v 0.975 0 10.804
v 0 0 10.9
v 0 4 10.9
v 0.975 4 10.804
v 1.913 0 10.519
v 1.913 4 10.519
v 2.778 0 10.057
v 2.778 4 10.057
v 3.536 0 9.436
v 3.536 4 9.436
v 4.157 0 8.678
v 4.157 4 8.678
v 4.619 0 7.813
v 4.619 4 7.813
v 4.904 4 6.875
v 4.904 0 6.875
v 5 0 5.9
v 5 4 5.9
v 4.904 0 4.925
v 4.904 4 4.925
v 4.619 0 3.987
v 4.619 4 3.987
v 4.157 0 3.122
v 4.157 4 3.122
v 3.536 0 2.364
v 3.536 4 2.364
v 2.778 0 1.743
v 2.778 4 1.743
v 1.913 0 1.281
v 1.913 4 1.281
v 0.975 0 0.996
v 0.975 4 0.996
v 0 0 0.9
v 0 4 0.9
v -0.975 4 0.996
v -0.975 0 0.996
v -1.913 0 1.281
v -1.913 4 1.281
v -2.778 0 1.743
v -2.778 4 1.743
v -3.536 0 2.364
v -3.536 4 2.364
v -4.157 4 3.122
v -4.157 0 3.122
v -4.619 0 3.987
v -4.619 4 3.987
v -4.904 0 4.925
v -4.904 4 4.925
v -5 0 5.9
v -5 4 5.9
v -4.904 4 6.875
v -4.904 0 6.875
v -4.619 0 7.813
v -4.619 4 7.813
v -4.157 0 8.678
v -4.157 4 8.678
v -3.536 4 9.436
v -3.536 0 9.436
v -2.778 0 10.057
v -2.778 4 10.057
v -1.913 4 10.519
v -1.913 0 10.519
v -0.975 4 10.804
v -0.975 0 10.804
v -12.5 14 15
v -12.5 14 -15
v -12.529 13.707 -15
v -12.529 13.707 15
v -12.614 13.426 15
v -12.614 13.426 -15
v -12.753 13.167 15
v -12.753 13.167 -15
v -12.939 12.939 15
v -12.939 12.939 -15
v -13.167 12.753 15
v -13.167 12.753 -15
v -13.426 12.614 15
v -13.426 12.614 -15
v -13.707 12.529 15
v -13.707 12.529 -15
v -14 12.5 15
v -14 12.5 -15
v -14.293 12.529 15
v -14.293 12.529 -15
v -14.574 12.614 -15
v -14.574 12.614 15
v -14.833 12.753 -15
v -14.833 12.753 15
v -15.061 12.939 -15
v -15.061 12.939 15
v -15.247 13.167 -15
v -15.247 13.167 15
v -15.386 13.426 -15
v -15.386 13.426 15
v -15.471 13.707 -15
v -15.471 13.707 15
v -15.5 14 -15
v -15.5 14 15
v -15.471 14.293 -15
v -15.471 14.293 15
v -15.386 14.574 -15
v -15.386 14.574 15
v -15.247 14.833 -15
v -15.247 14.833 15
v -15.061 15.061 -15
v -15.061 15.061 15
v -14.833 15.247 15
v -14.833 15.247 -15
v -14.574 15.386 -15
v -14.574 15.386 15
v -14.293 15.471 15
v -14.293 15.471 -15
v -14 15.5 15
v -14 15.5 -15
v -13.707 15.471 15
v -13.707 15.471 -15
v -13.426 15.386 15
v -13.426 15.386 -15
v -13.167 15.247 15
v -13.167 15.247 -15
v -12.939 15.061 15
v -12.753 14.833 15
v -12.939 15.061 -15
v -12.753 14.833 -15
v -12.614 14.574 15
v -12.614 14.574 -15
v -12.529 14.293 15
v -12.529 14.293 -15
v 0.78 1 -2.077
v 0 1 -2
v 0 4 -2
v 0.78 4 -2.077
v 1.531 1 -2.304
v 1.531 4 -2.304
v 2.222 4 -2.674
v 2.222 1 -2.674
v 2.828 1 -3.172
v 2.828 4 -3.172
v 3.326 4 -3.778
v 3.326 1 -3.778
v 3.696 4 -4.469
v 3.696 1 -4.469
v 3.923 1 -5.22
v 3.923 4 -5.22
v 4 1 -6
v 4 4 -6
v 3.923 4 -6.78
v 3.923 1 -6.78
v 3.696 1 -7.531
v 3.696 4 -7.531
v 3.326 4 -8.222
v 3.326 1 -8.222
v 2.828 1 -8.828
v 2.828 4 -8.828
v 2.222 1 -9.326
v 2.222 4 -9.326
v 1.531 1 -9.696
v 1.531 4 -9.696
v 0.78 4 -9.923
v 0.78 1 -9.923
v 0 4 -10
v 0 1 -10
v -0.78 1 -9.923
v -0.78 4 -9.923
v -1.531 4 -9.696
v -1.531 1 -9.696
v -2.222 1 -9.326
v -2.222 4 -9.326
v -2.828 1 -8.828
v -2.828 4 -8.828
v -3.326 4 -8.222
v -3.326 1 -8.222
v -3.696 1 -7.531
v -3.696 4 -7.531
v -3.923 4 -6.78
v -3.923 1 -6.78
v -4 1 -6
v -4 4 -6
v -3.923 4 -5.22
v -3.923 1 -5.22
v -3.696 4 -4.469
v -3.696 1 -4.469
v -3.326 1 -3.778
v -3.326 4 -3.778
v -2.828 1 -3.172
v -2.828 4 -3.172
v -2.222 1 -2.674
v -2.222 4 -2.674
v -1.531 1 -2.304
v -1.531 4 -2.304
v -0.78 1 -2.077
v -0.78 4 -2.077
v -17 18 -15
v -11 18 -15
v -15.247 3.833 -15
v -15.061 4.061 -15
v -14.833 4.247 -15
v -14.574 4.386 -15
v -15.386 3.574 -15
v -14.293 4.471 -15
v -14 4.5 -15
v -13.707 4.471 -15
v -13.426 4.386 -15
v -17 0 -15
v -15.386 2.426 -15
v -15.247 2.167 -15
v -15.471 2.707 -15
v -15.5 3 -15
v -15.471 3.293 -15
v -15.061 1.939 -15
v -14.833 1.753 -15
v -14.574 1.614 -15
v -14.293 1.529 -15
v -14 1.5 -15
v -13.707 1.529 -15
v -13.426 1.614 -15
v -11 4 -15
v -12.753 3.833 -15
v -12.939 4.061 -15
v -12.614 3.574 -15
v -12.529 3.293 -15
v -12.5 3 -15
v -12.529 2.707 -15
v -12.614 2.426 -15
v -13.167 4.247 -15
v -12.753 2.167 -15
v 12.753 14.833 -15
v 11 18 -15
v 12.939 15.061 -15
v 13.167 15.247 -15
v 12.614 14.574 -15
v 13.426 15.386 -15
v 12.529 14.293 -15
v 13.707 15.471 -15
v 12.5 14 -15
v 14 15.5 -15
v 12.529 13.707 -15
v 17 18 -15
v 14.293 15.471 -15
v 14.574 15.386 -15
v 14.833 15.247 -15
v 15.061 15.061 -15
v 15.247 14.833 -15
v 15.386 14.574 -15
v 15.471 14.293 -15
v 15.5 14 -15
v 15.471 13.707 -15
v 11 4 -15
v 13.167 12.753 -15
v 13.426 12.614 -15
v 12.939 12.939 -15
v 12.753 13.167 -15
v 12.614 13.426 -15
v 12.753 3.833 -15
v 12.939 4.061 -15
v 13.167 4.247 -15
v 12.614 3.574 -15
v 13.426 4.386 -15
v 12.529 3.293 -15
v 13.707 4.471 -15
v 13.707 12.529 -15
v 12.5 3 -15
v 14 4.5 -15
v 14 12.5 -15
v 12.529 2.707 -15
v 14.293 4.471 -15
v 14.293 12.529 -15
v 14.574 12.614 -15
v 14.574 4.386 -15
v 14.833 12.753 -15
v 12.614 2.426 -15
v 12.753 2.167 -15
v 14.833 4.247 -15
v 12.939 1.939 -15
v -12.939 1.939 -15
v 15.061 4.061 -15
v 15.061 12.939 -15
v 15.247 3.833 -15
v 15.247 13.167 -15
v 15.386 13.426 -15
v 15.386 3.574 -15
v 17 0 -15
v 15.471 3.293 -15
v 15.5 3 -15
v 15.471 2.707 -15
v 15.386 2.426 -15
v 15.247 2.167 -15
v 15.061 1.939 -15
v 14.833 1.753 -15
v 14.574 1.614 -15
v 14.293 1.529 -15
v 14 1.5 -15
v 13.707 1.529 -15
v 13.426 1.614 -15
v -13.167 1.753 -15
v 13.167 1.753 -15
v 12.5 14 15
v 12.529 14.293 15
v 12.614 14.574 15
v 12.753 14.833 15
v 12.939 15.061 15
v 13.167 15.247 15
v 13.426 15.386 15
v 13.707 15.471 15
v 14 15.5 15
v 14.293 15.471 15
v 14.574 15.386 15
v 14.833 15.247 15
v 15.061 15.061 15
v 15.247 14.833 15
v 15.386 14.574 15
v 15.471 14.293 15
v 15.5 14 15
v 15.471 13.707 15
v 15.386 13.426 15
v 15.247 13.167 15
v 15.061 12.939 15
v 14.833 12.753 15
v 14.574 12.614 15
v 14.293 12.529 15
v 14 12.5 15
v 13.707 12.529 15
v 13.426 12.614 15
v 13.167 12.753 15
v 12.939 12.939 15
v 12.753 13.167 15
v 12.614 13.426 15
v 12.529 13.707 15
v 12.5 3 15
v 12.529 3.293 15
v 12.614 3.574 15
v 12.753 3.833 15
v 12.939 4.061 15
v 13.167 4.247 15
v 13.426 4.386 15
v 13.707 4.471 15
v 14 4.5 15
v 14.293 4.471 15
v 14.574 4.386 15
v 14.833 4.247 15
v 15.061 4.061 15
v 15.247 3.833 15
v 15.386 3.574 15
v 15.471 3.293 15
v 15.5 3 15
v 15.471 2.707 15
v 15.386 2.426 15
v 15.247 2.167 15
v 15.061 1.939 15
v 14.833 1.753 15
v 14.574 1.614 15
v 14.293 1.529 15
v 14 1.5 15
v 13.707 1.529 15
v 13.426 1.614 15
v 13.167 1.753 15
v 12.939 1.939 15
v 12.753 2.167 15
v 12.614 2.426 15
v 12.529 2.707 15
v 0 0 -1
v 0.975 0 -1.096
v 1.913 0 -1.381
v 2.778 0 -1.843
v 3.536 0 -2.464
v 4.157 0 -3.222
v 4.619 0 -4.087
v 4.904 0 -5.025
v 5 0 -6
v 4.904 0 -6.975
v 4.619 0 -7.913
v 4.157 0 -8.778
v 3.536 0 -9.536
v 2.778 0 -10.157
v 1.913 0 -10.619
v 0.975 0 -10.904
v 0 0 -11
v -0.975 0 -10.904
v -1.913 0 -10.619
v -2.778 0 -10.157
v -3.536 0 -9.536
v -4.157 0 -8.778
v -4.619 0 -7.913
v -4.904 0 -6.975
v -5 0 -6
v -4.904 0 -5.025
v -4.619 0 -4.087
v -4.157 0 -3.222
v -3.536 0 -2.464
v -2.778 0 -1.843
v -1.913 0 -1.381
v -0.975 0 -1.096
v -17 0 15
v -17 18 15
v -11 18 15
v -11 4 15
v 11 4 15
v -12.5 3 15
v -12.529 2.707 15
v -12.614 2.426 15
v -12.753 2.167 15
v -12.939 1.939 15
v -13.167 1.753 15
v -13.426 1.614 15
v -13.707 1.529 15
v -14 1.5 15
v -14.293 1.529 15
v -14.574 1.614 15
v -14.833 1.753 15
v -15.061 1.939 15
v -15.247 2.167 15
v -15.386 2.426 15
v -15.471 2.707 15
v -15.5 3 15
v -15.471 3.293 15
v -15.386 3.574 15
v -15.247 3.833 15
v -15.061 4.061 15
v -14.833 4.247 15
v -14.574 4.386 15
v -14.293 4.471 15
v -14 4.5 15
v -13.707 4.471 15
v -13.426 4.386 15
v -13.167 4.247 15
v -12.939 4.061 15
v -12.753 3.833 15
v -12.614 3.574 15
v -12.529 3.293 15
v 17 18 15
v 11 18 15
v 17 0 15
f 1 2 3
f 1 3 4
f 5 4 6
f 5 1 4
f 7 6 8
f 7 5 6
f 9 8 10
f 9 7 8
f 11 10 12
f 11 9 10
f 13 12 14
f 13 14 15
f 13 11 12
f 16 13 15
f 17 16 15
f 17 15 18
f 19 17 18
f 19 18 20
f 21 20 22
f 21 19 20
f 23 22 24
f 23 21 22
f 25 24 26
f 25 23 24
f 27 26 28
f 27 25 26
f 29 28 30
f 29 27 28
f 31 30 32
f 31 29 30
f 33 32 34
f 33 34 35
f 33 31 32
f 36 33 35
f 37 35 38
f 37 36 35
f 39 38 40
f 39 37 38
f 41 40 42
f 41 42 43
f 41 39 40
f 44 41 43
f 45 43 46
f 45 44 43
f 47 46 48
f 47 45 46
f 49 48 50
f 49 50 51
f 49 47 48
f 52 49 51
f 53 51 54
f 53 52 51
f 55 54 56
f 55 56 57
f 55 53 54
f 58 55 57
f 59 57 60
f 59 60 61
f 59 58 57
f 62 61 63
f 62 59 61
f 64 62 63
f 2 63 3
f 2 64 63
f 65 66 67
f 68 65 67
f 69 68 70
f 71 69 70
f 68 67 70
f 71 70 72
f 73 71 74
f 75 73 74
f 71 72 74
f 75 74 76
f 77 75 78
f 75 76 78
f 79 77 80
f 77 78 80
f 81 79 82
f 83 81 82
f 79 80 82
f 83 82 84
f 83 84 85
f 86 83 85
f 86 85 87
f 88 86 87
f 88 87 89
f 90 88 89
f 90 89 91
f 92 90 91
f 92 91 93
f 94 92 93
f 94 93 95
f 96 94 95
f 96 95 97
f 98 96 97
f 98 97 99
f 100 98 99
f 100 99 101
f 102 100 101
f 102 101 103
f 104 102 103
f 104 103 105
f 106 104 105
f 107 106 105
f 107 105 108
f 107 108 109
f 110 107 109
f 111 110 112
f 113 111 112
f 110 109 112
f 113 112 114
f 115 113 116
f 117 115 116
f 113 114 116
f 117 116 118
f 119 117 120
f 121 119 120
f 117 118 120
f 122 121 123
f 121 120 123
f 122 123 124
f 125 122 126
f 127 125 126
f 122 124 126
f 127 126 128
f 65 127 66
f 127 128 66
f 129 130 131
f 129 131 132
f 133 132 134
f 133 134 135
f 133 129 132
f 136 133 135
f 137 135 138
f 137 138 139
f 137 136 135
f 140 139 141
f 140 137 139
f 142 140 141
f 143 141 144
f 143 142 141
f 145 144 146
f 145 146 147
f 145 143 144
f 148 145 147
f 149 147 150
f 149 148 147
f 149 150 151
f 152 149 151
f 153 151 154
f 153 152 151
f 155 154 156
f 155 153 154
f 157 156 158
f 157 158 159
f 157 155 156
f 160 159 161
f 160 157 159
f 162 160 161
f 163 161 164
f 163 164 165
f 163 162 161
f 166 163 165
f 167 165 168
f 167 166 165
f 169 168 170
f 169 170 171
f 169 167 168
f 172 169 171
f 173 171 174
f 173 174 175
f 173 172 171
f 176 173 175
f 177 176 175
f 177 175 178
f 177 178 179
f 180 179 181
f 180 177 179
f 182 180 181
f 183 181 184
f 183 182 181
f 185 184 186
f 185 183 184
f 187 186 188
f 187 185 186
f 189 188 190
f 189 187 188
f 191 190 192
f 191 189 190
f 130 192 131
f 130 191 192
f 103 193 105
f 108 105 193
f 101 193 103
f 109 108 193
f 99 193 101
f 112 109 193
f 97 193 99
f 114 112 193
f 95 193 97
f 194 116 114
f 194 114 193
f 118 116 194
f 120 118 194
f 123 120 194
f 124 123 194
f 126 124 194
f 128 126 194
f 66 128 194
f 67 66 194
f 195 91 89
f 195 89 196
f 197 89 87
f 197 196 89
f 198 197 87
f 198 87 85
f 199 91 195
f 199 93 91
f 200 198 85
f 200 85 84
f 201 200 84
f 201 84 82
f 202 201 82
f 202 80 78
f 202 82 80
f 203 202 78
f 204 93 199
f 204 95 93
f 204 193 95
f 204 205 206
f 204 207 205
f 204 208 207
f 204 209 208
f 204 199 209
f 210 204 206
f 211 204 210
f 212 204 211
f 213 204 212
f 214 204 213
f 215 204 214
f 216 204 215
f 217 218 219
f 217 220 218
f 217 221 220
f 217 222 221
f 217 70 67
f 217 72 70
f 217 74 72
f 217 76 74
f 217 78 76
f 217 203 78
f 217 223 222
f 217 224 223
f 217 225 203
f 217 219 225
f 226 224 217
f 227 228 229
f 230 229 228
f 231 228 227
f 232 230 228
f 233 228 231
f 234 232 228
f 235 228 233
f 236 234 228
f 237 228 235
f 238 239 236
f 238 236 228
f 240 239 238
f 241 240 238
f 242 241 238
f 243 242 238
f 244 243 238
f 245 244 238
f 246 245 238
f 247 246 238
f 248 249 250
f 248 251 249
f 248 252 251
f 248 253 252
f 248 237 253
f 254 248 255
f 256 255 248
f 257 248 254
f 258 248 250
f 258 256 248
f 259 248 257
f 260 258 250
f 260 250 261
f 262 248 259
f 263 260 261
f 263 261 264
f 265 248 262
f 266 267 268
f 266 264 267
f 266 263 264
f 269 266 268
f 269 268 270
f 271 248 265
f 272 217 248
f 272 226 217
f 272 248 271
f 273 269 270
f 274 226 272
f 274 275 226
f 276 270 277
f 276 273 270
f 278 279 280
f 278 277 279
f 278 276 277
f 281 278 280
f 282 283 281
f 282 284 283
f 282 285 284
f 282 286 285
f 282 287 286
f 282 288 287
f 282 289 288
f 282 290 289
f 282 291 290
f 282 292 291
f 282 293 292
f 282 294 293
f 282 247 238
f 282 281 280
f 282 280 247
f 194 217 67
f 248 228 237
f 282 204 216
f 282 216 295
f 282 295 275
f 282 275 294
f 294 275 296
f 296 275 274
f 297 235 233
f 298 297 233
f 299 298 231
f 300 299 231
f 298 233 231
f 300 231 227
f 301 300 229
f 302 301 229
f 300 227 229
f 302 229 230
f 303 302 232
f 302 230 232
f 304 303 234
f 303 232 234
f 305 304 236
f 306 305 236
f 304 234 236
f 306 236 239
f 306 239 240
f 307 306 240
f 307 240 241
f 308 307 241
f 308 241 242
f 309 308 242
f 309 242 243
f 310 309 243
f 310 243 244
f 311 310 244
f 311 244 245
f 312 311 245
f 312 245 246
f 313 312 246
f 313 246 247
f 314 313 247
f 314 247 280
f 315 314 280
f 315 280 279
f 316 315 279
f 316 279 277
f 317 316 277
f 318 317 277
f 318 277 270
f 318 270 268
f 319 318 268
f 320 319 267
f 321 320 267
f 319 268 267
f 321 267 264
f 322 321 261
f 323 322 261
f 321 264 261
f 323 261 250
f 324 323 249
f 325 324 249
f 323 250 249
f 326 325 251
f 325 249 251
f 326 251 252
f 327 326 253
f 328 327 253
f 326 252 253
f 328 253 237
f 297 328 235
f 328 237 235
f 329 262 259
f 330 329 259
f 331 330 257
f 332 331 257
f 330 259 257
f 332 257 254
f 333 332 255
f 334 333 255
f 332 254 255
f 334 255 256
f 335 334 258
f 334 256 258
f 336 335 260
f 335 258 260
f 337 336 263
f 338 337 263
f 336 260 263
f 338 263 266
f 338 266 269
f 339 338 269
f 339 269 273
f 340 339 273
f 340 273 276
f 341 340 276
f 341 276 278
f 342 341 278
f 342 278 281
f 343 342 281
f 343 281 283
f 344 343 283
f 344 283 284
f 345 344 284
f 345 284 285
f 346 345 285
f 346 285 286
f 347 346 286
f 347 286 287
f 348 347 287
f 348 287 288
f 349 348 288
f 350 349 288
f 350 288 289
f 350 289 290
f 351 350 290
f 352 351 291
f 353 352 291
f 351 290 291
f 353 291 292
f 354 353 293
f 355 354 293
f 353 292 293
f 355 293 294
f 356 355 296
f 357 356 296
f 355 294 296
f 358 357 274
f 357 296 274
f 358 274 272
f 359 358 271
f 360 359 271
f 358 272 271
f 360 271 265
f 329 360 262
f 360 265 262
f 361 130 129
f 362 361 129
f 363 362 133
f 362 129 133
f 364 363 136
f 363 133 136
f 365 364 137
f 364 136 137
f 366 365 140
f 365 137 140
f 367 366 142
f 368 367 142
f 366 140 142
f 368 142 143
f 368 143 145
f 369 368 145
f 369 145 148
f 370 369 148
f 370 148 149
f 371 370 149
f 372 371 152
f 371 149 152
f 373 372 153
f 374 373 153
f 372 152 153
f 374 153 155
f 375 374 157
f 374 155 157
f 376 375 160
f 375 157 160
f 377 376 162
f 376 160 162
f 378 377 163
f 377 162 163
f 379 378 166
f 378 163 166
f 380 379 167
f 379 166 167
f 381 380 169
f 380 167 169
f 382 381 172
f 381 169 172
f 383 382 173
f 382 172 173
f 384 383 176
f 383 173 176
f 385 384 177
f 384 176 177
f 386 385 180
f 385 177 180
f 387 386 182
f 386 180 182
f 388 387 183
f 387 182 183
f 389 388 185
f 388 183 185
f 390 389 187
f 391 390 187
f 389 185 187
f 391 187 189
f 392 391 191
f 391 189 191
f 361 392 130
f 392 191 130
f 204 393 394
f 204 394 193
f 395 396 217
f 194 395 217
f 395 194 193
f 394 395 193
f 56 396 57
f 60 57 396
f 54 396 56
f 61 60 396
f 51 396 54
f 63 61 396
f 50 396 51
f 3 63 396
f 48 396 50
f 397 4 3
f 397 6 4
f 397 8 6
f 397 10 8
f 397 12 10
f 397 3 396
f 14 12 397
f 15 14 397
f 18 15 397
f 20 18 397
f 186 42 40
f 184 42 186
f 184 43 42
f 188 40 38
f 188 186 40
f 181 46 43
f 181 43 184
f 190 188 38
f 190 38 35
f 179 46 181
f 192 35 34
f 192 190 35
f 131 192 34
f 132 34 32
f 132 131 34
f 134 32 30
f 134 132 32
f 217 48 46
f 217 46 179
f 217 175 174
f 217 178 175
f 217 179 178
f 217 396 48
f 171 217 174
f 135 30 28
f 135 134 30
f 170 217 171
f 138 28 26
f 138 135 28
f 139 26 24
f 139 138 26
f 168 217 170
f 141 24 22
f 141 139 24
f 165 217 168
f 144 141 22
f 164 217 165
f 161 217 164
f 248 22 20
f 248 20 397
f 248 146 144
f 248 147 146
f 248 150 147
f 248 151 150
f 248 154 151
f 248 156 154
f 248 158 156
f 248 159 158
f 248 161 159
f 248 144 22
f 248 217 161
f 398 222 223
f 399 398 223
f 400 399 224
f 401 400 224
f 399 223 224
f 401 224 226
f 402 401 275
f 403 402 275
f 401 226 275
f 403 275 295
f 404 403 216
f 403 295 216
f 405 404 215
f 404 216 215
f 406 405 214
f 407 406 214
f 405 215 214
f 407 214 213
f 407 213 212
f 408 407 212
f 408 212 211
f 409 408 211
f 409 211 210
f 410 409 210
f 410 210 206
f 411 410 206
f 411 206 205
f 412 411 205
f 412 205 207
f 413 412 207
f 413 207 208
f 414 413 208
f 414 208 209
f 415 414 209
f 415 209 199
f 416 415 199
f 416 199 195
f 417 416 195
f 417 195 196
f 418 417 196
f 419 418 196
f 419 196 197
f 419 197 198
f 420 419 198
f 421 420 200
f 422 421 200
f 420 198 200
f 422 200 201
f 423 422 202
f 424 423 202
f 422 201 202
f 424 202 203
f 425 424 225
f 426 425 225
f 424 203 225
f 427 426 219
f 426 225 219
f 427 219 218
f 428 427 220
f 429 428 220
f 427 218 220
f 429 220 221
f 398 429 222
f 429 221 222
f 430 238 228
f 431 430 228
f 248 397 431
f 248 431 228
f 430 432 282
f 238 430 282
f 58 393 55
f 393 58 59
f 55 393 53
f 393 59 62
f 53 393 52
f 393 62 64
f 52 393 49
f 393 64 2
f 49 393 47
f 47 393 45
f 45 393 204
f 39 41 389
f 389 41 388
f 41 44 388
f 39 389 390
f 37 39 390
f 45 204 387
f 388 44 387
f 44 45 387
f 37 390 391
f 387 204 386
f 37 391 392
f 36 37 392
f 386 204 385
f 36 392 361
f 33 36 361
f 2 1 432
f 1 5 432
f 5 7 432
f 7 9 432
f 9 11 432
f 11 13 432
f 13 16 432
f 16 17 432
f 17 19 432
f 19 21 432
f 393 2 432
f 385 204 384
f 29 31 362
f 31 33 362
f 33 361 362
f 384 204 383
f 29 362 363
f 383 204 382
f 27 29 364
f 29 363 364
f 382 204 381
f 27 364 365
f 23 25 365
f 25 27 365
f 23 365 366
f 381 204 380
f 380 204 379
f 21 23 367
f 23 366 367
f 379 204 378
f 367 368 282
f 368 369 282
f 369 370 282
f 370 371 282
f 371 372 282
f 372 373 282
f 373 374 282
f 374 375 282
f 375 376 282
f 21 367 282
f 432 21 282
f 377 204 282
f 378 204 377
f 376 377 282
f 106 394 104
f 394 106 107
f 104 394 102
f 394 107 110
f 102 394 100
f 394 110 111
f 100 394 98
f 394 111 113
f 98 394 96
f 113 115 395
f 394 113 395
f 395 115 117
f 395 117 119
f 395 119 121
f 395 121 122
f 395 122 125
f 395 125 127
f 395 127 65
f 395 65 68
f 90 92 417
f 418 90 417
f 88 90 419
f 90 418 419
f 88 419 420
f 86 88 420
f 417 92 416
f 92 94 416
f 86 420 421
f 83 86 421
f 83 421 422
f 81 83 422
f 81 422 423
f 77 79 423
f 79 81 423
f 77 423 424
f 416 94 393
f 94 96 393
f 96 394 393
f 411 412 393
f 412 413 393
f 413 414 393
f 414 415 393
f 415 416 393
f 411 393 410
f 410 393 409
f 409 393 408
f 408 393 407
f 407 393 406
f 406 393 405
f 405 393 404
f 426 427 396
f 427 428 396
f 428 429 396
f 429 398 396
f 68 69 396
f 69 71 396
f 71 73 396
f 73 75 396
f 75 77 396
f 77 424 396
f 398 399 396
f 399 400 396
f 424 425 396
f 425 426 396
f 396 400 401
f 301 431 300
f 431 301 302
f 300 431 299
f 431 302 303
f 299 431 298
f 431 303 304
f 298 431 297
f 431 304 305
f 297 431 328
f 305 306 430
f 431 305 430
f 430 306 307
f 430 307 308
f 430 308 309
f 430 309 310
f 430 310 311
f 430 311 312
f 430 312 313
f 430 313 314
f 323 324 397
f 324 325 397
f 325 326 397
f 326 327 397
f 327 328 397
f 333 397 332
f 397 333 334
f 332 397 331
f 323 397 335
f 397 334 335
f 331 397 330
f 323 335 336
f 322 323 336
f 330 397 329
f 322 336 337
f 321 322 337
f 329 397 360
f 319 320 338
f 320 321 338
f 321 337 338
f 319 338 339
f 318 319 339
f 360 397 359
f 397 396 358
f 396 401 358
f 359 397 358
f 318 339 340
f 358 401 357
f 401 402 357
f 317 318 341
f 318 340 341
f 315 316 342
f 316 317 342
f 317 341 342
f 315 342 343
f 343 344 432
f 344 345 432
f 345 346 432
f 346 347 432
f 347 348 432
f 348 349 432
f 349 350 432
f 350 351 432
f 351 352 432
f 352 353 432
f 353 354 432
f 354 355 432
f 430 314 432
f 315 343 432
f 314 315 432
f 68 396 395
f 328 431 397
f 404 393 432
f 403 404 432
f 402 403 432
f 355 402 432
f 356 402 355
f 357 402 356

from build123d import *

# Parameters (mm, degrees)
SKETCH_1_W          = 34
SKETCH_1_H          = 30
SKETCH_1_R          = 4
SKETCH_1_R_2        = 5
EXTRUDE_1_DEPTH     = 4
SKETCH_3_W          = 6
SKETCH_3_H          = 30
EXTRUDE_2_DEPTH     = 15
SKETCH_4_R          = 1.5
CUT_EXTRUDE_1_DEPTH = 40.37003937
SKETCH_5_W          = 34
SKETCH_5_H          = 1
CUT_EXTRUDE_2_DEPTH = 40.37003937
CHAMFER_1_SIZE      = 1


with BuildPart() as part:
    # 草图1 → 凸台-拉伸1 (new body)
    with BuildSketch(Plane(origin=(0, 0, 0), x_dir=(1, 0, 0), z_dir=(0, 1, 0))):
        Rectangle(SKETCH_1_W, SKETCH_1_H)
        with Locations(Location((0, 6, 0), (0, 0, 270))):
            Circle(SKETCH_1_R, mode=Mode.SUBTRACT)
        with Locations(Location((0, -5.9, 0), (0, 0, 270))):
            Circle(SKETCH_1_R_2, mode=Mode.SUBTRACT)
    extrude(amount=EXTRUDE_1_DEPTH)

    # 草图3 → 凸台-拉伸2 (add)
    with BuildSketch(Plane(origin=(0, 4, 0), x_dir=(1, 0, 0), z_dir=(0, 1, 0))):
        with Locations((-14, 0)):
            Rectangle(SKETCH_3_W, SKETCH_3_H)
        with Locations((14, 0)):
            Rectangle(SKETCH_3_W, SKETCH_3_H)
    extrude(amount=EXTRUDE_2_DEPTH)

    # 草图4 → 切除-拉伸1 (cut, through all)
    with BuildSketch(Plane(origin=(0, 0, -15), x_dir=(-1, 0, 0), z_dir=(0, 0, -1))):
        with Locations((-14, 3)):
            Circle(SKETCH_4_R)
        with Locations((-14, 14)):
            Circle(SKETCH_4_R)
        with Locations(Location((14, 3, 0), (0, 0, 180))):
            Circle(SKETCH_4_R)
        with Locations(Location((14, 14, 0), (0, 0, 180))):
            Circle(SKETCH_4_R)
    extrude(amount=-CUT_EXTRUDE_1_DEPTH, mode=Mode.SUBTRACT)

    # 草图5 → 切除-拉伸2 (cut, through all)
    with BuildSketch(Plane(origin=(0, 0, -15), x_dir=(-1, 0, 0), z_dir=(0, 0, -1))):
        with Locations((0, 18.5)):
            Rectangle(SKETCH_5_W, SKETCH_5_H)
    extrude(amount=-CUT_EXTRUDE_2_DEPTH, mode=Mode.SUBTRACT)

    # 倒角1
    chamfer_1_edges = [part.edges().sort_by_distance(p)[0] for p in [
        (0, 0, -10),
    ]]
    chamfer(chamfer_1_edges, length=CHAMFER_1_SIZE)


solid = part.part
